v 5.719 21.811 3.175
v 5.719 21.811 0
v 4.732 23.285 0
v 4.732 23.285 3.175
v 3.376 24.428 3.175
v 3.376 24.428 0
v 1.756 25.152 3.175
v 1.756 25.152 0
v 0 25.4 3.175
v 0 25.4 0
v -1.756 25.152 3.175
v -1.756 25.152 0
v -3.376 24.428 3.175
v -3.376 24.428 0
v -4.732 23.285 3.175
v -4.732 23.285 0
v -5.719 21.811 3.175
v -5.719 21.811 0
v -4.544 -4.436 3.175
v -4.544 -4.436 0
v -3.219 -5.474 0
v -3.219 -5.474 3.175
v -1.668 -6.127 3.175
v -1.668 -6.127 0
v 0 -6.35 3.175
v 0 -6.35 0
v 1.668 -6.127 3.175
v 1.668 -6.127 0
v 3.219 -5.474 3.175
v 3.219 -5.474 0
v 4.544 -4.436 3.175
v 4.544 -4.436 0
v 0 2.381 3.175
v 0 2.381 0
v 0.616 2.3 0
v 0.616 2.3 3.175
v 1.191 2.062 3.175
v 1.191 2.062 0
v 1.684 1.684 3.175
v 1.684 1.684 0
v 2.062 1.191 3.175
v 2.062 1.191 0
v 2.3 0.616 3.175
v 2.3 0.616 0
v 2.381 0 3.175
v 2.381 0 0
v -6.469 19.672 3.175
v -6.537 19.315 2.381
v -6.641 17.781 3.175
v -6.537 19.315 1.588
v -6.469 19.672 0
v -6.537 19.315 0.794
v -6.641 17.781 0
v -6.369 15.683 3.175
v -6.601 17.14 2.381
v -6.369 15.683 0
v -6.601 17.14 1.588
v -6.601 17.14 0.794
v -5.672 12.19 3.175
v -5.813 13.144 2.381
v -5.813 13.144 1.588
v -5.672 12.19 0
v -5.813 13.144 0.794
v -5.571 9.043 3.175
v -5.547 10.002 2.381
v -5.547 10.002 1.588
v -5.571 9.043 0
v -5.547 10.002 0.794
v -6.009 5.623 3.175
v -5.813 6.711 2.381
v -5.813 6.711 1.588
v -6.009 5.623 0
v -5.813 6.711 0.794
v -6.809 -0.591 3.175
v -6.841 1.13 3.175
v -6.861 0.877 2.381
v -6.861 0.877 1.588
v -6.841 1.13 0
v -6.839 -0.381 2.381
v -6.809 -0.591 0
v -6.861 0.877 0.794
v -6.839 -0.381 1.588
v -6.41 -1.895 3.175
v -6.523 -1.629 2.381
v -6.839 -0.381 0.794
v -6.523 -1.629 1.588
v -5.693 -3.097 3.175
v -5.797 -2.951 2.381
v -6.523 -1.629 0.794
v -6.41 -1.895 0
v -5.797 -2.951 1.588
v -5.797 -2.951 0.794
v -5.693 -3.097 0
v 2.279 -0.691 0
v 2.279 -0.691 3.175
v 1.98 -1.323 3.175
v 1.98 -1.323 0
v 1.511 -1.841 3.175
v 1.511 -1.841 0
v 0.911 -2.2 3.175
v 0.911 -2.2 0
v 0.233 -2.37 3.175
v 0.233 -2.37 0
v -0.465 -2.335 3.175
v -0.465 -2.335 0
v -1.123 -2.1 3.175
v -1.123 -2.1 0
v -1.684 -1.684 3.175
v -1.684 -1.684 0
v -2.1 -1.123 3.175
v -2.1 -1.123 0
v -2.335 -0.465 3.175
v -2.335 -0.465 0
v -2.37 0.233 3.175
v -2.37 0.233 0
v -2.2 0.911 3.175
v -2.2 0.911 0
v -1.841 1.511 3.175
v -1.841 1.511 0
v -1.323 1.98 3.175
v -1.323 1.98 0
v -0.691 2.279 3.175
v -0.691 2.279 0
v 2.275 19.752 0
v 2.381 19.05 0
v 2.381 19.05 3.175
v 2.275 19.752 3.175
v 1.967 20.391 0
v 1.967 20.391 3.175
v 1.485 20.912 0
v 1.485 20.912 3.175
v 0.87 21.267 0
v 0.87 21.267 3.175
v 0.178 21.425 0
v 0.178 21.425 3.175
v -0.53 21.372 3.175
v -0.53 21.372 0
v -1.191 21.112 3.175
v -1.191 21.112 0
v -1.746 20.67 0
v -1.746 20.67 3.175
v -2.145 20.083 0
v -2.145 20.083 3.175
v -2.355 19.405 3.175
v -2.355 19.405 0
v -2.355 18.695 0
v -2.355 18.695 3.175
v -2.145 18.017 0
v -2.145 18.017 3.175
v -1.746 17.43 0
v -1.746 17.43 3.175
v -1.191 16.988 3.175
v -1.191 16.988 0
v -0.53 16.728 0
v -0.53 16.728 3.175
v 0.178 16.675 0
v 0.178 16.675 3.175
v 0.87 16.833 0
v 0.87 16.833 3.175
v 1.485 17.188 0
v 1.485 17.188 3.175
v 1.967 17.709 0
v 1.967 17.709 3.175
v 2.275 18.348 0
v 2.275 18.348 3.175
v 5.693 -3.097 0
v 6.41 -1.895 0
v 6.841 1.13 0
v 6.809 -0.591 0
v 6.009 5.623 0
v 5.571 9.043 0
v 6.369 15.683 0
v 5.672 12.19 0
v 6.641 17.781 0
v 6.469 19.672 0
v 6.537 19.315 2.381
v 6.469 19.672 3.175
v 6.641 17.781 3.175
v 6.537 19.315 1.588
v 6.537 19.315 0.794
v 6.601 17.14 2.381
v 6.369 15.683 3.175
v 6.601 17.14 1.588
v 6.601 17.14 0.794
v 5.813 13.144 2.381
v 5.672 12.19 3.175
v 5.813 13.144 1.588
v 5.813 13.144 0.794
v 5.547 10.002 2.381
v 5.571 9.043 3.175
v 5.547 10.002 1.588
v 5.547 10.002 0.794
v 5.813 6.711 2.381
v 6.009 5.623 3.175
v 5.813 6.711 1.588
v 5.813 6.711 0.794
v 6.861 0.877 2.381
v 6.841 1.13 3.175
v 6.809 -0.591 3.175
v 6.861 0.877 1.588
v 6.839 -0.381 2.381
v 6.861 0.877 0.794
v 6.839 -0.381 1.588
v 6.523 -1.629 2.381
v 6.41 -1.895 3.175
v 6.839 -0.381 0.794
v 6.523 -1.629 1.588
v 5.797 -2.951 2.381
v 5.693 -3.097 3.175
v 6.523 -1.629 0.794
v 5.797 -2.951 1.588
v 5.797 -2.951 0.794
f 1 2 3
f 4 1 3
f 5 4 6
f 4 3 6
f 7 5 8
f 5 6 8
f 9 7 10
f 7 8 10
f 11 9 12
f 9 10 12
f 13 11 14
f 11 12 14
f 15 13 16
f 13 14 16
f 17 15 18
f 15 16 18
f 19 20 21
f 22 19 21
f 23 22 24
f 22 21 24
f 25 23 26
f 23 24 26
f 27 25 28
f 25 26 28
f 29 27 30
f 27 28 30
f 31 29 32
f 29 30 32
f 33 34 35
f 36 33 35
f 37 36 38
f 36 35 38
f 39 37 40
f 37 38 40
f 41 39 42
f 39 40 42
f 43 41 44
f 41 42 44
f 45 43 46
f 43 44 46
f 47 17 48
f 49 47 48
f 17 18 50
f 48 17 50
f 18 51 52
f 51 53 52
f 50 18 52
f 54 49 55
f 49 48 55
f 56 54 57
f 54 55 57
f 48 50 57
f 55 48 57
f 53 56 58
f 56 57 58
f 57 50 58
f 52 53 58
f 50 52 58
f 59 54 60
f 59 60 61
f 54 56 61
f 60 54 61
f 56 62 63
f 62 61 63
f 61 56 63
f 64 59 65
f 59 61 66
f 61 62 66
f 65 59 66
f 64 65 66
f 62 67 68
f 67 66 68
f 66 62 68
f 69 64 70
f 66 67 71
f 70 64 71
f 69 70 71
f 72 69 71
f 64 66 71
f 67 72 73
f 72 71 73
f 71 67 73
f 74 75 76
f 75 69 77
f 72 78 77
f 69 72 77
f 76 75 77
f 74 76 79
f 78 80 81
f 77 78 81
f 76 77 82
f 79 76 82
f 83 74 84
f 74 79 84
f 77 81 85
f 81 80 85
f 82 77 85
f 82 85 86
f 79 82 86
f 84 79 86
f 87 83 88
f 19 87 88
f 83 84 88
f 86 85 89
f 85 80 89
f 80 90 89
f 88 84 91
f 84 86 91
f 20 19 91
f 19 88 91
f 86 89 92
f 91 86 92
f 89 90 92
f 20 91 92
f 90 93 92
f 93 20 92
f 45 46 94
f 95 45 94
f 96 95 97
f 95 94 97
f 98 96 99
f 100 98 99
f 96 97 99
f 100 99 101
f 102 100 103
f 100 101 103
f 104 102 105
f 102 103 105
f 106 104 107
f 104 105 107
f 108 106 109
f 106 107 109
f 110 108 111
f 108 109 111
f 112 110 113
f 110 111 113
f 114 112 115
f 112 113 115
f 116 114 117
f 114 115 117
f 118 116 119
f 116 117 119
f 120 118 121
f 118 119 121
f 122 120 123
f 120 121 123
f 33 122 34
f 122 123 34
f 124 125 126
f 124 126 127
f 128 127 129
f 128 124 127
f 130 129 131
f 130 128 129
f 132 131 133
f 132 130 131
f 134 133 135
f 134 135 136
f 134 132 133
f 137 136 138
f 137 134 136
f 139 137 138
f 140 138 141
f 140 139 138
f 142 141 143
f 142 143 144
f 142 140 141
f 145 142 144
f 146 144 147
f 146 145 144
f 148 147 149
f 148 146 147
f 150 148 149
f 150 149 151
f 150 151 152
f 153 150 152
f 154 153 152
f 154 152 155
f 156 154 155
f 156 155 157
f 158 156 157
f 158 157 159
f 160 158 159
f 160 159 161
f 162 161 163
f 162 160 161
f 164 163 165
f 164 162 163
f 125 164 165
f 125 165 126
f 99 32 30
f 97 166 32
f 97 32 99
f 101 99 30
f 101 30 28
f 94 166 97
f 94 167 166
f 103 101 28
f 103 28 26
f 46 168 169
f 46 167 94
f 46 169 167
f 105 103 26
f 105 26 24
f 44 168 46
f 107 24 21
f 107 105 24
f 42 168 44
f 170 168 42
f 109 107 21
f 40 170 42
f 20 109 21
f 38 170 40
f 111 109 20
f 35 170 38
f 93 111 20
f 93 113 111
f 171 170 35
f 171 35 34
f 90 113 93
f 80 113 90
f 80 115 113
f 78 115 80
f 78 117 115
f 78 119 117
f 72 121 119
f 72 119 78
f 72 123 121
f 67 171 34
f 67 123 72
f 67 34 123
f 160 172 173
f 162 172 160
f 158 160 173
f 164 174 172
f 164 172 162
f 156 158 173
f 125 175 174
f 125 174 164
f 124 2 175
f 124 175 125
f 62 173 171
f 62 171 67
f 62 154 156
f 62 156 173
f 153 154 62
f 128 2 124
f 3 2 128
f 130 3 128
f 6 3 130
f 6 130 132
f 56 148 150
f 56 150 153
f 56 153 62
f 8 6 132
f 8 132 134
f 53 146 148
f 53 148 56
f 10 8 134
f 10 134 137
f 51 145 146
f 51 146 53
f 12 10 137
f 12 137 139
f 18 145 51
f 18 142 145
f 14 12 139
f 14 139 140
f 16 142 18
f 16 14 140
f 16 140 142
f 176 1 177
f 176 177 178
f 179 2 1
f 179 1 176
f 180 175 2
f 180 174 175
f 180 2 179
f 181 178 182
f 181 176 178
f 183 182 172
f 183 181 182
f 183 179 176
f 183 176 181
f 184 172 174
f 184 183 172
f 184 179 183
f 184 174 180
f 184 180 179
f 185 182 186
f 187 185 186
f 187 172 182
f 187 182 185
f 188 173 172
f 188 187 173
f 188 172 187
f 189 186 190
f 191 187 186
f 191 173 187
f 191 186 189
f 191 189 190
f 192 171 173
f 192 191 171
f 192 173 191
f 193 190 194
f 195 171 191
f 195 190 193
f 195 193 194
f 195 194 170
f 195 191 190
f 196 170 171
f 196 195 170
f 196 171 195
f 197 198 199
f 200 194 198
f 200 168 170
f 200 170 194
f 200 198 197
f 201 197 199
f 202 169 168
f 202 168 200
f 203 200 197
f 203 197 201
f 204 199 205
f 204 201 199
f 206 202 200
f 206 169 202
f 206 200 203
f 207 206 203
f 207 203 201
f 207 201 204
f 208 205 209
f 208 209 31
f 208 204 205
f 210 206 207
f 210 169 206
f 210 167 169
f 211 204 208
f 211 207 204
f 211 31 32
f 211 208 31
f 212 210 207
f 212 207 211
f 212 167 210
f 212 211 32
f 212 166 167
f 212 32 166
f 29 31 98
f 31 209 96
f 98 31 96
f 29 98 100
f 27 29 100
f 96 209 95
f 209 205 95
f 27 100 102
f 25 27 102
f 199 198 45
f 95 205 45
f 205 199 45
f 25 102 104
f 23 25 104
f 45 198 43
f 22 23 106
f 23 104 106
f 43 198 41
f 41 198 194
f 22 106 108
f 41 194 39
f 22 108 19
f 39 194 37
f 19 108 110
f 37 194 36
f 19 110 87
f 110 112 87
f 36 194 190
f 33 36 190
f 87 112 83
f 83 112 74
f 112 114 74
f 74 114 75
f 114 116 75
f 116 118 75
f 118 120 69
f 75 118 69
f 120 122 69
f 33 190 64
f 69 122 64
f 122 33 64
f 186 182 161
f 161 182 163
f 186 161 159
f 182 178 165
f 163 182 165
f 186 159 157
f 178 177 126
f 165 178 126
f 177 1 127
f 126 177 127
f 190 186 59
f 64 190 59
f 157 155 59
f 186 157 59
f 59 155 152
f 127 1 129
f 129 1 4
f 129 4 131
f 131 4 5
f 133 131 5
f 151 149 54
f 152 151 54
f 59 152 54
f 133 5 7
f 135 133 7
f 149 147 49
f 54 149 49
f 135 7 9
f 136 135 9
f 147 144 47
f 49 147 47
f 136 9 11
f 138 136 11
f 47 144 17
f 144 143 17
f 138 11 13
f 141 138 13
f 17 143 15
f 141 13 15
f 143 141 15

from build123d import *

# Parameters (mm, degrees)
SKETCH1_R           = 2.38125
BOSS_EXTRUDE1_DEPTH = 3.175


with BuildPart() as part:
    # Sketch1 → Boss-Extrude1 (new body)
    with BuildSketch(Plane.XY):
        with BuildLine():
            add(Edge.make_bspline(
                [(5.71857736, 21.810502305), (7.460464953, 18.202057953), (5.437393373, 14.111430659), (5.474739559, 6.883315357), (7.338602203, 0.649545133), (6.619204962, -2.309875554), (4.543798803, -4.43580798)],
                knots=[0, 0, 0, 0, 0.323130599, 0.562945369, 0.783927572, 1, 1, 1, 1], degree=3))
            ThreePointArc((5.71857736, 21.810502305), (0, 25.4), (-5.71857736, 21.810502305))
            add(Edge.make_bspline(
                [(-5.71857736, 21.810502305), (-7.460464953, 18.202057953), (-5.437393373, 14.111430659), (-5.474739559, 6.883315357), (-7.338602203, 0.649545133), (-6.619204962, -2.309875554), (-4.543798803, -4.43580798)],
                knots=[0, 0, 0, 0, 0.323130599, 0.562945369, 0.783927572, 1, 1, 1, 1], degree=3))
            ThreePointArc((-4.543798803, -4.43580798), (0, -6.35), (4.543798803, -4.43580798))
        make_face()
        with BuildLine():
            ThreePointArc((0, 2.38125), (1.683798023, 1.683798023), (2.38125, 0))
            ThreePointArc((2.38125, 0), (-1.683798023, -1.683798023), (0, 2.38125))
        make_face(mode=Mode.SUBTRACT)
        with Locations((0, 19.05)):
            Circle(SKETCH1_R, mode=Mode.SUBTRACT)
    extrude(amount=BOSS_EXTRUDE1_DEPTH)


solid = part.part
